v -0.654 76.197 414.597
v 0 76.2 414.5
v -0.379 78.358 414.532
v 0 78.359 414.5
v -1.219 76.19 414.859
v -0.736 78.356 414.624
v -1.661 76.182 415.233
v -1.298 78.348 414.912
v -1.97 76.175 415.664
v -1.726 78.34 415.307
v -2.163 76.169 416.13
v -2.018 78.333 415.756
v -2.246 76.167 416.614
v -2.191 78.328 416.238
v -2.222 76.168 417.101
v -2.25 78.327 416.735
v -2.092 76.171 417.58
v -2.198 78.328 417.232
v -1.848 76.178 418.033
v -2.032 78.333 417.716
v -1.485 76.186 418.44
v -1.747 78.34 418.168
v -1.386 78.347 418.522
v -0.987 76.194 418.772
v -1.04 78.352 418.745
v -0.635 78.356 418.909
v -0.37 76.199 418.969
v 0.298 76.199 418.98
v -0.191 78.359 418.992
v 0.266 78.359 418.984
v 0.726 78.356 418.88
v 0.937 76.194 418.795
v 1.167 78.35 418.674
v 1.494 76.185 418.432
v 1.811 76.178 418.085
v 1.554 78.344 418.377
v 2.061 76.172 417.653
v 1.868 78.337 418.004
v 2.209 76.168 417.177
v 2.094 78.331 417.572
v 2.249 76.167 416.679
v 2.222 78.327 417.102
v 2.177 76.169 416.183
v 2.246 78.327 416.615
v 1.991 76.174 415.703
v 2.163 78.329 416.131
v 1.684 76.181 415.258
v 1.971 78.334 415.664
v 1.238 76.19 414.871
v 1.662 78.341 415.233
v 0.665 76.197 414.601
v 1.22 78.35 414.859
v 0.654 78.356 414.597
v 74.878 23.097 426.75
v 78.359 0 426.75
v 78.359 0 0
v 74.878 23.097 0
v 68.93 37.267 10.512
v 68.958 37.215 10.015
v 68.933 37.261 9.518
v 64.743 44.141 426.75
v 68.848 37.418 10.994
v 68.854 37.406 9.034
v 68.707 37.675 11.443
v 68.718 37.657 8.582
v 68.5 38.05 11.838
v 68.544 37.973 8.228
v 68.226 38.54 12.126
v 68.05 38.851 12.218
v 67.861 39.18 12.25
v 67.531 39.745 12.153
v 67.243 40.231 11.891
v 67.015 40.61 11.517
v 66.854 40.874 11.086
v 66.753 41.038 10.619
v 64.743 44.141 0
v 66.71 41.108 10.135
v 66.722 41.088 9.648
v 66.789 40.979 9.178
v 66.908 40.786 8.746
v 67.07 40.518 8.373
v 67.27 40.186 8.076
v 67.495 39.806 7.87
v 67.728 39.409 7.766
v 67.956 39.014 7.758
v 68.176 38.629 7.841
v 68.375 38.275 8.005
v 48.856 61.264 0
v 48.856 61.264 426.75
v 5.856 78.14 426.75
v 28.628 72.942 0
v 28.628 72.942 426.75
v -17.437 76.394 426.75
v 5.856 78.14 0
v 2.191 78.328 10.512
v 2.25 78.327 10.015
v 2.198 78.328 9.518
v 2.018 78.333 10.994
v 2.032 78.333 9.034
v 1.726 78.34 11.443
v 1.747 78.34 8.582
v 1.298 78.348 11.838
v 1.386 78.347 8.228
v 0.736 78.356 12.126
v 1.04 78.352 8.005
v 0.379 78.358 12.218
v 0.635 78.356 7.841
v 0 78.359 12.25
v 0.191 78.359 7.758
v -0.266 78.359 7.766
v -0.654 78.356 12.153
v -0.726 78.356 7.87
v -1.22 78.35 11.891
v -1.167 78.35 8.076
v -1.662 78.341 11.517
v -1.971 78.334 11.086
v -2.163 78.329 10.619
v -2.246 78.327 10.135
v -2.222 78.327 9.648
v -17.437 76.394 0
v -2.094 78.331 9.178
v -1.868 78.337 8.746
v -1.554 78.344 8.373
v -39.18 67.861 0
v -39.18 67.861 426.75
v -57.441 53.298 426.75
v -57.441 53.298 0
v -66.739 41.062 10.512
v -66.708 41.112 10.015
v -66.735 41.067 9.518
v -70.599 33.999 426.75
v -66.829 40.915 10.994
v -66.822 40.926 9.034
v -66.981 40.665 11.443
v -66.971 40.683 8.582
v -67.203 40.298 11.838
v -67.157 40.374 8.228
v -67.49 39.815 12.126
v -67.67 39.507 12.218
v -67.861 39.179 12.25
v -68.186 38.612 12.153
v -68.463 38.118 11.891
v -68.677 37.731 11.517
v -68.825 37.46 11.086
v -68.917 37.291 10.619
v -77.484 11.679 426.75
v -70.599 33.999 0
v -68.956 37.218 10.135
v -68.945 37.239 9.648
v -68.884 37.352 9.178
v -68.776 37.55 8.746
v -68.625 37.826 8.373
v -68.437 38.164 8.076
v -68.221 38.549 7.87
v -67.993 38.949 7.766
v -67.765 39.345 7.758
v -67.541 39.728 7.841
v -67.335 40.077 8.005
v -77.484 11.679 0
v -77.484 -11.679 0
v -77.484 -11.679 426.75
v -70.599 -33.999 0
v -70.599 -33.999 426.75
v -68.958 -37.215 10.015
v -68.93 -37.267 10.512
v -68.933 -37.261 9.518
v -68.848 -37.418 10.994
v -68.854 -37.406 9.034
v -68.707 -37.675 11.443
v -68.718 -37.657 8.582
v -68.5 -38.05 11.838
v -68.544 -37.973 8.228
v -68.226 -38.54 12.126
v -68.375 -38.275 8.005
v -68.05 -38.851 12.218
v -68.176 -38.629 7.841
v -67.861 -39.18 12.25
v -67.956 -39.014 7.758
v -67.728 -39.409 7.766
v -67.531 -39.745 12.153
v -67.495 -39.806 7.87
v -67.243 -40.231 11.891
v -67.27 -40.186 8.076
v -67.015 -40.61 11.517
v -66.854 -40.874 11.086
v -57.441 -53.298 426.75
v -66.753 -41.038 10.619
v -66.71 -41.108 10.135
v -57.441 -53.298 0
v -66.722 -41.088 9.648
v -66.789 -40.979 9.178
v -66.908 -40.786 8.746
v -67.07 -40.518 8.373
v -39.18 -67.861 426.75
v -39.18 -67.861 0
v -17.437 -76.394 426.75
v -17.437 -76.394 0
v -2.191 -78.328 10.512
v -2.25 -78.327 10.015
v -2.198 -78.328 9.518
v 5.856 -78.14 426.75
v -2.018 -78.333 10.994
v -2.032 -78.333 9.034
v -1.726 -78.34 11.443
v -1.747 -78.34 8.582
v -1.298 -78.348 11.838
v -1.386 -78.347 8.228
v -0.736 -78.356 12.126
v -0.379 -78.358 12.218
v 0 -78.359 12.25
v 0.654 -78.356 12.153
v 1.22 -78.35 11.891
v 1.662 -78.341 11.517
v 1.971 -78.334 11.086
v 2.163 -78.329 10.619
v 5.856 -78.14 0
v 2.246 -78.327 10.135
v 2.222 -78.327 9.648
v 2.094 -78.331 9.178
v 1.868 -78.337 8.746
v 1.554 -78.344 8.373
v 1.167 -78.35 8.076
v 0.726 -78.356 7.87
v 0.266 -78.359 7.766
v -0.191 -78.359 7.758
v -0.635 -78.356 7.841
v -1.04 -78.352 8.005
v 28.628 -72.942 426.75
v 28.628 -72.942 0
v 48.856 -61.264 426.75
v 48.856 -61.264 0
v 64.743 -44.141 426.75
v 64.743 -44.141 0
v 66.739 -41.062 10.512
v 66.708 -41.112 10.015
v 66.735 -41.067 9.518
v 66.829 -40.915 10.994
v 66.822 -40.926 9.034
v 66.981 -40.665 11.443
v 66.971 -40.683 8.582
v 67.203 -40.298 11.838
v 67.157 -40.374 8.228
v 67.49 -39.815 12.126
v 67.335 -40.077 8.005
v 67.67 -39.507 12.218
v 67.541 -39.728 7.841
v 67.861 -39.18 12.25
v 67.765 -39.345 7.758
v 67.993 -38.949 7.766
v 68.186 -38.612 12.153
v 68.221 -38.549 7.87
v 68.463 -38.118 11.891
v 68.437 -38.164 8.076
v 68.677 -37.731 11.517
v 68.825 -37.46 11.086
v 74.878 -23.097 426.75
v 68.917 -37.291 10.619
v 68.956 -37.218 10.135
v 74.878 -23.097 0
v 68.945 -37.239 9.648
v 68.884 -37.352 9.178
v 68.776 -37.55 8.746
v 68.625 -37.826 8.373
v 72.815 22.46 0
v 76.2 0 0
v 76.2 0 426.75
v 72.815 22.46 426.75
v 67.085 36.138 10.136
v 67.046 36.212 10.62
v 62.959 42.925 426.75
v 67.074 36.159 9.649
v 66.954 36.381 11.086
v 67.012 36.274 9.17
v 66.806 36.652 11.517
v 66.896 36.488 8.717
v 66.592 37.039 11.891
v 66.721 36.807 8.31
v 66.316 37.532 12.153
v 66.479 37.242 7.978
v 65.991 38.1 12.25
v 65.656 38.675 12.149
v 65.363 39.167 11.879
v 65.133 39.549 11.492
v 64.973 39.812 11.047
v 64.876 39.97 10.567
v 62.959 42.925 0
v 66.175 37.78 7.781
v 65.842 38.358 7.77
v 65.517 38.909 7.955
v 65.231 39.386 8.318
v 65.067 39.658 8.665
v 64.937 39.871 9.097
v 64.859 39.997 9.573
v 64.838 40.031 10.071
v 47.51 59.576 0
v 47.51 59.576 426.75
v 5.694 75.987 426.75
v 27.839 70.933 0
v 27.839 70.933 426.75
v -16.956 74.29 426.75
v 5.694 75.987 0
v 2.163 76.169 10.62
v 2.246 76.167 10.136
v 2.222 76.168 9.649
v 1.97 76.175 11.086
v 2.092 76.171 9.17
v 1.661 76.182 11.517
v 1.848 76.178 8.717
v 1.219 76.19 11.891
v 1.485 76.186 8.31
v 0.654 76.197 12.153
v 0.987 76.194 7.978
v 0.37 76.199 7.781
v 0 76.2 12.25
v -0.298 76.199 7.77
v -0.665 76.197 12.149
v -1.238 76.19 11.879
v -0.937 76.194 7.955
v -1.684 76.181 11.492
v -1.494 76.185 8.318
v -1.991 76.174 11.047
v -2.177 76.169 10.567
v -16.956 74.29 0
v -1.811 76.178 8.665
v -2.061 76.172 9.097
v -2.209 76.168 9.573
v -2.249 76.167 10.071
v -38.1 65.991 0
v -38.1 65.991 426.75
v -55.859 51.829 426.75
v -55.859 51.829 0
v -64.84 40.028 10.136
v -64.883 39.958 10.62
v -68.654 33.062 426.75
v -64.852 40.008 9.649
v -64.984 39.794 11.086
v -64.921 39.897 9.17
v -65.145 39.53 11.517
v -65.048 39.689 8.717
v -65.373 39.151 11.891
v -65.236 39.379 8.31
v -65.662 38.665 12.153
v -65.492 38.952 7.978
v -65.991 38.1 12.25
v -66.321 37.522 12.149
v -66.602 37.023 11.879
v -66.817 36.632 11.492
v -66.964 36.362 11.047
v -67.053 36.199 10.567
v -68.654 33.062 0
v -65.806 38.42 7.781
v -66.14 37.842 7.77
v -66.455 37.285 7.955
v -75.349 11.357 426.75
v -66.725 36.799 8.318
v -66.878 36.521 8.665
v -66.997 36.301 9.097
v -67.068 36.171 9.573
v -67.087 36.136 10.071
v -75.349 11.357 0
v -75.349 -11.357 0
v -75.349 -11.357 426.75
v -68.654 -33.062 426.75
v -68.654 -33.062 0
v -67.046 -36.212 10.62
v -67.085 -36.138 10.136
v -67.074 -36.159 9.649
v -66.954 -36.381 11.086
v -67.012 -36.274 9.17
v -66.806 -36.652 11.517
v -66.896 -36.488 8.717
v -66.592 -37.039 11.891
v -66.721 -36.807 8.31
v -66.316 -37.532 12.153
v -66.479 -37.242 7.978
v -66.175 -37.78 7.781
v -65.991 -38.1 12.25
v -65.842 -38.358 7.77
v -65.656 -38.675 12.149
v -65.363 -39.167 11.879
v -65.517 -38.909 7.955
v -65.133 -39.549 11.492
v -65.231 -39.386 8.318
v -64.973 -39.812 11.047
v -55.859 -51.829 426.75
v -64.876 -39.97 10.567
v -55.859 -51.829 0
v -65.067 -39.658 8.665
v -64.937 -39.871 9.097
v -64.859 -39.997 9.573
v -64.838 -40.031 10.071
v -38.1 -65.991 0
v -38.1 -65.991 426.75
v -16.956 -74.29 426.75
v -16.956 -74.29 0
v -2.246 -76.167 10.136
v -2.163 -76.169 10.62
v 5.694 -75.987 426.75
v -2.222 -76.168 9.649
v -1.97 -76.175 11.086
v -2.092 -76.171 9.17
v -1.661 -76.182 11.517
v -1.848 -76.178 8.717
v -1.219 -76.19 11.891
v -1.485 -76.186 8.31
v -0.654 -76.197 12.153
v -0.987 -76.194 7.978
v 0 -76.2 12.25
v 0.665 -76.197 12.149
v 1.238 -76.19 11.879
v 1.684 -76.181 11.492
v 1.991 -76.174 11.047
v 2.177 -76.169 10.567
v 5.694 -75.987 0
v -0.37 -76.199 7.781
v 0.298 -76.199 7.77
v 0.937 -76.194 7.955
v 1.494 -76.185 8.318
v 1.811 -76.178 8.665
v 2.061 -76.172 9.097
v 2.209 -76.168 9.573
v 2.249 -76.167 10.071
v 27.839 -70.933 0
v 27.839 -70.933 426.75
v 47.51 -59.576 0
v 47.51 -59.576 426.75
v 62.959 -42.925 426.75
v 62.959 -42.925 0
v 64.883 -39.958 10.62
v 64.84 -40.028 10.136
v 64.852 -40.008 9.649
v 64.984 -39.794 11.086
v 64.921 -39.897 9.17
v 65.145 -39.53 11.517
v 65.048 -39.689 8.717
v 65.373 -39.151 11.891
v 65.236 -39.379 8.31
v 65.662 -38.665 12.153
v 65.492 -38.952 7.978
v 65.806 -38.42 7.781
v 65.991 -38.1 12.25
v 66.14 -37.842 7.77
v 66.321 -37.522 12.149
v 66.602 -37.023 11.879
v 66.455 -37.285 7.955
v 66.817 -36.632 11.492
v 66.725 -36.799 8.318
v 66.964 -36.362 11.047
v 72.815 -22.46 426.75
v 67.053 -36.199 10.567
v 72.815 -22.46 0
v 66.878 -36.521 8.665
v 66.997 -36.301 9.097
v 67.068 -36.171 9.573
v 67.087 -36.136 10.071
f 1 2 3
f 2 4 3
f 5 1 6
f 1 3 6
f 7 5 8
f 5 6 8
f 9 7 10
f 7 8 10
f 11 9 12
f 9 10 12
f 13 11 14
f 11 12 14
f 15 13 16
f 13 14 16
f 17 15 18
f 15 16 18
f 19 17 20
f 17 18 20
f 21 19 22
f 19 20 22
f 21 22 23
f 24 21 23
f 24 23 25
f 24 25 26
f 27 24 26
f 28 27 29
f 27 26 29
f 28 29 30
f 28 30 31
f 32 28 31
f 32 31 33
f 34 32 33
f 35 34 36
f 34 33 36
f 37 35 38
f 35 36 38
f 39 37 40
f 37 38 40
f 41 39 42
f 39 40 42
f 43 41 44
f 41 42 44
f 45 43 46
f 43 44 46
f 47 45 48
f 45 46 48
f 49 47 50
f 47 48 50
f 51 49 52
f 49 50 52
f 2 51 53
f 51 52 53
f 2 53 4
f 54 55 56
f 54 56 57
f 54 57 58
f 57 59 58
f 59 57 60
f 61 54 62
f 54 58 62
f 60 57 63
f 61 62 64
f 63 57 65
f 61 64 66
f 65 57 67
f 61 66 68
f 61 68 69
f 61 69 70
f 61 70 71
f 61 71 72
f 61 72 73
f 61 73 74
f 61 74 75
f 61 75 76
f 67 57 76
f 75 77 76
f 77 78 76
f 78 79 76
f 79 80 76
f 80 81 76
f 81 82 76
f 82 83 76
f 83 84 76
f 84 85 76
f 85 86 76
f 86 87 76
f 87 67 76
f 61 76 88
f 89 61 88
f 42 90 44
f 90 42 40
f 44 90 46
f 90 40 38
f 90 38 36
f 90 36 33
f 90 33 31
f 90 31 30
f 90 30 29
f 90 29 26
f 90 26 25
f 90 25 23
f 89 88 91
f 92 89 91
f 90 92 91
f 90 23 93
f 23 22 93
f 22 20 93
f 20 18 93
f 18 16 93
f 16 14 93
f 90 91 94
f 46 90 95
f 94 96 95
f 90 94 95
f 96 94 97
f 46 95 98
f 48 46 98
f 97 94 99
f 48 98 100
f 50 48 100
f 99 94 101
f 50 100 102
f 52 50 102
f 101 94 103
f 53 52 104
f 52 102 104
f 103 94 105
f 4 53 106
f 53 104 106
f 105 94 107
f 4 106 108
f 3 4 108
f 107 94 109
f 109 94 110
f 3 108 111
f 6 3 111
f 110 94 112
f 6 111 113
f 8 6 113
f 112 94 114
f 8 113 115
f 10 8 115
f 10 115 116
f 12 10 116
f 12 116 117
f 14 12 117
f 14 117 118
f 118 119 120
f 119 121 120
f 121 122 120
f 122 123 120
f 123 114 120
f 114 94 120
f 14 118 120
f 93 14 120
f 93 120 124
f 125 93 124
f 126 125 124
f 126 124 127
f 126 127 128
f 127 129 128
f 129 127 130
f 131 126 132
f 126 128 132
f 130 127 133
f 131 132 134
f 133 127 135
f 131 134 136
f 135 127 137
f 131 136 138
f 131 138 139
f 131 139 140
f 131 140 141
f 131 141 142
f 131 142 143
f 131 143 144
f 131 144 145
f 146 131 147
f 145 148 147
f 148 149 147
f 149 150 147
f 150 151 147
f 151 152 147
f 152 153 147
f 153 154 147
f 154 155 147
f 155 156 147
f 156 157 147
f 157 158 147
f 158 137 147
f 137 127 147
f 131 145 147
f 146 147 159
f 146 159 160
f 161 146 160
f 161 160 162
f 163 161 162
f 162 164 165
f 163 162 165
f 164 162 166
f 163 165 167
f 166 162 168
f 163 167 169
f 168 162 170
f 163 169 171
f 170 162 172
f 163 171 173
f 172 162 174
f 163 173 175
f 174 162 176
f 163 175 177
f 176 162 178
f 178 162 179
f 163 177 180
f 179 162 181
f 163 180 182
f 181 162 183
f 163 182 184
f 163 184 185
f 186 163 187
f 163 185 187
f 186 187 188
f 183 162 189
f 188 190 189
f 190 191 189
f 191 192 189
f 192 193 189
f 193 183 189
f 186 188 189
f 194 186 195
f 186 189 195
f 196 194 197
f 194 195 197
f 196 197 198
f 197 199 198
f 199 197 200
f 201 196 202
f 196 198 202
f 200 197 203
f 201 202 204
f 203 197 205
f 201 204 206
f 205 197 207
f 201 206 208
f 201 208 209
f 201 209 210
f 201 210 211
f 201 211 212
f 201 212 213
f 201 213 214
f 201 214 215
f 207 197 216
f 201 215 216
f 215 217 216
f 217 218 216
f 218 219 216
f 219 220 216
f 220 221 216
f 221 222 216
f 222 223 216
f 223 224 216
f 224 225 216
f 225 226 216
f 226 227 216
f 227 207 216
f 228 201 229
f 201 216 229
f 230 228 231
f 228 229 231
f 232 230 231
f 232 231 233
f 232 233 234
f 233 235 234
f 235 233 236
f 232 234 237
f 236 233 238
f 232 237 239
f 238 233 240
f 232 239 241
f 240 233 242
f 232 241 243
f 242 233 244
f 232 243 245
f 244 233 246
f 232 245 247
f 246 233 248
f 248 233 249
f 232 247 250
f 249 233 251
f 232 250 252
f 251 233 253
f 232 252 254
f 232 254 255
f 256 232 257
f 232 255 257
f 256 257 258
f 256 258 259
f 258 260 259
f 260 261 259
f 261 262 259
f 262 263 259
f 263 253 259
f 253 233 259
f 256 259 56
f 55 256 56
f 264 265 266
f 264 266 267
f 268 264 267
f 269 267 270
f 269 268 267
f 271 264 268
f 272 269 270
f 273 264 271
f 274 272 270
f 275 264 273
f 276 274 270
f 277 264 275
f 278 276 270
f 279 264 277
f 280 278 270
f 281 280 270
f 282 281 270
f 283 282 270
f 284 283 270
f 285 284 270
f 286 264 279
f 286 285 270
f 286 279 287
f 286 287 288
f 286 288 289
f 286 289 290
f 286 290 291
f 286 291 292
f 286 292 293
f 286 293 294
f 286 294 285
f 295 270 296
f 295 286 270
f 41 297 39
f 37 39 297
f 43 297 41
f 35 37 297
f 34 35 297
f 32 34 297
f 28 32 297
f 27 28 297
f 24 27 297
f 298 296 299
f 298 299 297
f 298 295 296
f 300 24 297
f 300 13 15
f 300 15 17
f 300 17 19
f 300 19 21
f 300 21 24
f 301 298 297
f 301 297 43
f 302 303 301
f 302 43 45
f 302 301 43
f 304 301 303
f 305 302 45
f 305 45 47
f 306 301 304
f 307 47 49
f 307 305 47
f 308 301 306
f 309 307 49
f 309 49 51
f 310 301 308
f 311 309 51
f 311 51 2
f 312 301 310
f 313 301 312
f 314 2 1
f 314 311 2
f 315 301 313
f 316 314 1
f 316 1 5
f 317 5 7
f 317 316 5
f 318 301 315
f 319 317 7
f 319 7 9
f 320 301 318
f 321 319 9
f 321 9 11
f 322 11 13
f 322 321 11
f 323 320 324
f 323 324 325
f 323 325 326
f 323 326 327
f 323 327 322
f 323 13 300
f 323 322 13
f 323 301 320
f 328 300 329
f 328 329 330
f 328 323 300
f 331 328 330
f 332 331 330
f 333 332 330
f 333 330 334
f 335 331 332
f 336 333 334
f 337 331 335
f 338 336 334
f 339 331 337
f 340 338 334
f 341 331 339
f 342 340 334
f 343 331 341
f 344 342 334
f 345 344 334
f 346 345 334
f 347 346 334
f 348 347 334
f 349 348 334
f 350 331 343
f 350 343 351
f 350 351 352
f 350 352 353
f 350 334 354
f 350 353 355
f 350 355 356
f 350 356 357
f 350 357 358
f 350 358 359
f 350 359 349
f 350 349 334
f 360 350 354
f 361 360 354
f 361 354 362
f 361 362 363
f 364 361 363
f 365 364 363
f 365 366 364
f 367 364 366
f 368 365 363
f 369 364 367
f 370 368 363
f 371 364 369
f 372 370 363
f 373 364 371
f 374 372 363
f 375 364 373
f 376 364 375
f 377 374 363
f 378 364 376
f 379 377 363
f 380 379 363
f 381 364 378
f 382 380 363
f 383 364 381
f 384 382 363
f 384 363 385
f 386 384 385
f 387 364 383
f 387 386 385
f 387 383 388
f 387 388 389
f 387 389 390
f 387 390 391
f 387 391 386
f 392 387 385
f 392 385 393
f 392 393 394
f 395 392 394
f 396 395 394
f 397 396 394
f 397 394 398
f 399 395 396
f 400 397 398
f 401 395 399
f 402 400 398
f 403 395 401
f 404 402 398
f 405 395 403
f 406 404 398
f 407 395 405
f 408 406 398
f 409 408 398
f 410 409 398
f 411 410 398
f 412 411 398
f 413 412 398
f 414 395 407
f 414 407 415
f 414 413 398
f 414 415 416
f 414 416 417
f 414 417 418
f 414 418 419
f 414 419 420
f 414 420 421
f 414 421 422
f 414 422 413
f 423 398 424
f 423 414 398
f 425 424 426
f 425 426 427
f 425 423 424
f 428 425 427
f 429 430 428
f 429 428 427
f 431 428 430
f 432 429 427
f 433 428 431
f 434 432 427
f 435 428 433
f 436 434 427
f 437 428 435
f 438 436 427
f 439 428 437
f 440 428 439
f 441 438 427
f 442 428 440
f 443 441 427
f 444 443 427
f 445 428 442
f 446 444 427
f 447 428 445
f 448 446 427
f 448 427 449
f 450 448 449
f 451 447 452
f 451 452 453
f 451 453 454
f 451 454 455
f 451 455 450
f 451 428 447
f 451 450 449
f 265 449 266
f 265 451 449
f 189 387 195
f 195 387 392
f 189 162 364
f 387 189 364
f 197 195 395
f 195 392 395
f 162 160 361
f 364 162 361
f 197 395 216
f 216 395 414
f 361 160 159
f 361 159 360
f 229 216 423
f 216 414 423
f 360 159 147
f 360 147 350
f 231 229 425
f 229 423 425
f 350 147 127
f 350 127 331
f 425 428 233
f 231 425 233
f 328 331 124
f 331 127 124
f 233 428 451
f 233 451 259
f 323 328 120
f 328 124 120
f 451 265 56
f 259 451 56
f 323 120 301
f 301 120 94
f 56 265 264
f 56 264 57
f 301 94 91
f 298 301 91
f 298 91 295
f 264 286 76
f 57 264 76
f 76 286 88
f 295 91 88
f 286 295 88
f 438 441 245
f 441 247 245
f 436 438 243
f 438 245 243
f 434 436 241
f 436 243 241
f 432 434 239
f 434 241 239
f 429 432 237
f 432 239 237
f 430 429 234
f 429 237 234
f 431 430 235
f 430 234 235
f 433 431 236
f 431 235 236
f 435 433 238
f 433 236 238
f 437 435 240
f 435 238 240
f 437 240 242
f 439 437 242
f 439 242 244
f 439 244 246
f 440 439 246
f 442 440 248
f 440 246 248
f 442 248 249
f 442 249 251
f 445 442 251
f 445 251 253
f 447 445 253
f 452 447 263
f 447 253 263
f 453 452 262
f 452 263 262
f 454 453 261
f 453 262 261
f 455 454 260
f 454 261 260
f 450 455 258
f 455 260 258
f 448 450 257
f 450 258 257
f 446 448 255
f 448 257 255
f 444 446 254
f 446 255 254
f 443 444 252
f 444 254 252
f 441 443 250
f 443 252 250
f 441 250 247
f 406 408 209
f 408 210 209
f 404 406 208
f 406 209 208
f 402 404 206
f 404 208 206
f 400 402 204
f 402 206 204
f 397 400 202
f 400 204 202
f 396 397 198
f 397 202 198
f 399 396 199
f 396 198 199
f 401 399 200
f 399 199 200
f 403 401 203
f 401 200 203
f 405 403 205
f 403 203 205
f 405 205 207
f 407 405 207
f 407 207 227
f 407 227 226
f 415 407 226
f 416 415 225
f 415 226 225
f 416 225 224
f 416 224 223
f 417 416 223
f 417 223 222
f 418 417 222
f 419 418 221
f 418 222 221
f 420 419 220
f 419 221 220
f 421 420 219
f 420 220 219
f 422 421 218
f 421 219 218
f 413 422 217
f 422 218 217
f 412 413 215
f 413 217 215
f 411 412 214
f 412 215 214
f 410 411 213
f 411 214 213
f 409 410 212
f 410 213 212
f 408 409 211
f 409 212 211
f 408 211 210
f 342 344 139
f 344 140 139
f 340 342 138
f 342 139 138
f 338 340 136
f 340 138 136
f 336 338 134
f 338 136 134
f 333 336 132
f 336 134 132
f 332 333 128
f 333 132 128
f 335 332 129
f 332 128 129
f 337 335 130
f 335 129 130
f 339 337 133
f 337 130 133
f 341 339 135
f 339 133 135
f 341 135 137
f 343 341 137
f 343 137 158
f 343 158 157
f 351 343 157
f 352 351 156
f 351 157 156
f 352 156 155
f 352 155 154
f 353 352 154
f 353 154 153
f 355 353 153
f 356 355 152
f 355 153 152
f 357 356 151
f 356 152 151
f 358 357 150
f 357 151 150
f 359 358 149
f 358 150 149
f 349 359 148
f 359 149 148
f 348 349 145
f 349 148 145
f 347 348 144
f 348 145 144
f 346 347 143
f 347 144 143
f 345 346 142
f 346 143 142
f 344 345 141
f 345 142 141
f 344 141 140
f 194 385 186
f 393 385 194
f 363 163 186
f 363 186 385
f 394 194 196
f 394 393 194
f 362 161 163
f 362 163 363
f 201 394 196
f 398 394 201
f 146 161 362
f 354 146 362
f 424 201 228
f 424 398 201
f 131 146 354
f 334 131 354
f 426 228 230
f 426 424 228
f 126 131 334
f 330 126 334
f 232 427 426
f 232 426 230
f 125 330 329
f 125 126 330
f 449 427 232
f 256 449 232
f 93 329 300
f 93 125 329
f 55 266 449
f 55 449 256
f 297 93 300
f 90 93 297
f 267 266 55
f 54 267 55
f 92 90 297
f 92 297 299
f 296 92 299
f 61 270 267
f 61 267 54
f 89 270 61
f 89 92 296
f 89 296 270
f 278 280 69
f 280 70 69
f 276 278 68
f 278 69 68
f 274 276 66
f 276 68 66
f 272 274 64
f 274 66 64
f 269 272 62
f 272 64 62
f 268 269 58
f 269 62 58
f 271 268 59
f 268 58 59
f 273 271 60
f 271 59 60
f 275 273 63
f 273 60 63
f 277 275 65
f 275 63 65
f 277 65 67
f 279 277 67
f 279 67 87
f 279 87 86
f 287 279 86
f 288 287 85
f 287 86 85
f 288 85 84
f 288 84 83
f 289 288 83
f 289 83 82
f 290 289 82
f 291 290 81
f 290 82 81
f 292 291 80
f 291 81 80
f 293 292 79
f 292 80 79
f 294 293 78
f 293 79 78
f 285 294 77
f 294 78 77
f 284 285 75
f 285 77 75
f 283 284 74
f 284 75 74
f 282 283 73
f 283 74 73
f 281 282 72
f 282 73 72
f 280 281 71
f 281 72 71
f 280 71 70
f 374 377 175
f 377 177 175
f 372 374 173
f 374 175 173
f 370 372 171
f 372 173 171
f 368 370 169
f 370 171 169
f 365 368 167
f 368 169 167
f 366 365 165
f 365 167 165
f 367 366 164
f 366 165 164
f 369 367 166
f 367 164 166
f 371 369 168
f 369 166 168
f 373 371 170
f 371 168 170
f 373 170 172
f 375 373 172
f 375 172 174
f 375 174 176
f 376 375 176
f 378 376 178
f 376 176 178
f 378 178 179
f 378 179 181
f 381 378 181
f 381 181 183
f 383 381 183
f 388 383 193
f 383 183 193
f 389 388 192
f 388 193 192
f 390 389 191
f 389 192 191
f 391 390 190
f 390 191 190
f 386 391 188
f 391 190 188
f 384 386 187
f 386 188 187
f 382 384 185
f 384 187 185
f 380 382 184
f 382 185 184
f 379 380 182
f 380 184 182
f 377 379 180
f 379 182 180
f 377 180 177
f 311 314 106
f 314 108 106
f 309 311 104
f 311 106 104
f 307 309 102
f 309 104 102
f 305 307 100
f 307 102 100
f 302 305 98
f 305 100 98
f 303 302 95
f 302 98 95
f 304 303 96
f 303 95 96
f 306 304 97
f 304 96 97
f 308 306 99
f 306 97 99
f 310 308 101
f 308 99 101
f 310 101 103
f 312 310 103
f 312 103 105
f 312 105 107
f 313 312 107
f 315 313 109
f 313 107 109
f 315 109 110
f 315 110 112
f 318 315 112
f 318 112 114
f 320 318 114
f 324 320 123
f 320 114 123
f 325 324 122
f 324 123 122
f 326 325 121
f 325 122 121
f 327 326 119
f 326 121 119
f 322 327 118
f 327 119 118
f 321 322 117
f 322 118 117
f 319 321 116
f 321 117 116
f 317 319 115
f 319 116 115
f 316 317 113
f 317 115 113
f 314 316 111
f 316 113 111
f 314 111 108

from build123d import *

# Parameters (mm, degrees)
SKETCH1_R           = 78.359
SKETCH1_R_2         = 76.2
BOSS_EXTRUDE1_DEPTH = 426.75
SKETCH5_W           = 2.25
SKETCH5_H           = 78.359
CIRPATTERN1_COUNT   = 6
SKETCH7_W           = 2.25
SKETCH7_H           = 78.359


with BuildPart() as part:
    # Sketch1 → Boss-Extrude1 (new body)
    with BuildSketch(Plane.XY):
        Circle(SKETCH1_R)
        Circle(SKETCH1_R_2, mode=Mode.SUBTRACT)
    extrude(amount=BOSS_EXTRUDE1_DEPTH)

    # Sketch5 → M4 Clearance Hole2 (revolve, cut)
    with BuildSketch(Plane(origin=(0, 0, 10), x_dir=(0, 0, 1), z_dir=(1, 0, 0))):
        with Locations((1.125, 39.1795)):
            Rectangle(SKETCH5_W, SKETCH5_H)
    m4_clearance_hole2 = revolve(axis=Axis((0, 6.35, 10), (0, -1, 0)), mode=Mode.SUBTRACT)

    # CirPattern1: M4 Clearance Hole2 ×6 about axis
    cirpattern1_axis = Axis((0, 0, 426.75), (0, 0, -1))
    for i in range(1, CIRPATTERN1_COUNT):
        add(m4_clearance_hole2.rotate(cirpattern1_axis, i * 360 / CIRPATTERN1_COUNT), mode=Mode.SUBTRACT)

    # Sketch7 → M4 Clearance Hole3 (revolve, cut)
    with BuildSketch(Plane(origin=(0, 0, 416.75), x_dir=(0, 0, -1), z_dir=(1, 0, 0))):
        with Locations((1.125, 39.1795)):
            Rectangle(SKETCH7_W, SKETCH7_H)
    revolve(axis=Axis((0, -6.35, 416.75), (0, 1, 0)), mode=Mode.SUBTRACT)


solid = part.part
